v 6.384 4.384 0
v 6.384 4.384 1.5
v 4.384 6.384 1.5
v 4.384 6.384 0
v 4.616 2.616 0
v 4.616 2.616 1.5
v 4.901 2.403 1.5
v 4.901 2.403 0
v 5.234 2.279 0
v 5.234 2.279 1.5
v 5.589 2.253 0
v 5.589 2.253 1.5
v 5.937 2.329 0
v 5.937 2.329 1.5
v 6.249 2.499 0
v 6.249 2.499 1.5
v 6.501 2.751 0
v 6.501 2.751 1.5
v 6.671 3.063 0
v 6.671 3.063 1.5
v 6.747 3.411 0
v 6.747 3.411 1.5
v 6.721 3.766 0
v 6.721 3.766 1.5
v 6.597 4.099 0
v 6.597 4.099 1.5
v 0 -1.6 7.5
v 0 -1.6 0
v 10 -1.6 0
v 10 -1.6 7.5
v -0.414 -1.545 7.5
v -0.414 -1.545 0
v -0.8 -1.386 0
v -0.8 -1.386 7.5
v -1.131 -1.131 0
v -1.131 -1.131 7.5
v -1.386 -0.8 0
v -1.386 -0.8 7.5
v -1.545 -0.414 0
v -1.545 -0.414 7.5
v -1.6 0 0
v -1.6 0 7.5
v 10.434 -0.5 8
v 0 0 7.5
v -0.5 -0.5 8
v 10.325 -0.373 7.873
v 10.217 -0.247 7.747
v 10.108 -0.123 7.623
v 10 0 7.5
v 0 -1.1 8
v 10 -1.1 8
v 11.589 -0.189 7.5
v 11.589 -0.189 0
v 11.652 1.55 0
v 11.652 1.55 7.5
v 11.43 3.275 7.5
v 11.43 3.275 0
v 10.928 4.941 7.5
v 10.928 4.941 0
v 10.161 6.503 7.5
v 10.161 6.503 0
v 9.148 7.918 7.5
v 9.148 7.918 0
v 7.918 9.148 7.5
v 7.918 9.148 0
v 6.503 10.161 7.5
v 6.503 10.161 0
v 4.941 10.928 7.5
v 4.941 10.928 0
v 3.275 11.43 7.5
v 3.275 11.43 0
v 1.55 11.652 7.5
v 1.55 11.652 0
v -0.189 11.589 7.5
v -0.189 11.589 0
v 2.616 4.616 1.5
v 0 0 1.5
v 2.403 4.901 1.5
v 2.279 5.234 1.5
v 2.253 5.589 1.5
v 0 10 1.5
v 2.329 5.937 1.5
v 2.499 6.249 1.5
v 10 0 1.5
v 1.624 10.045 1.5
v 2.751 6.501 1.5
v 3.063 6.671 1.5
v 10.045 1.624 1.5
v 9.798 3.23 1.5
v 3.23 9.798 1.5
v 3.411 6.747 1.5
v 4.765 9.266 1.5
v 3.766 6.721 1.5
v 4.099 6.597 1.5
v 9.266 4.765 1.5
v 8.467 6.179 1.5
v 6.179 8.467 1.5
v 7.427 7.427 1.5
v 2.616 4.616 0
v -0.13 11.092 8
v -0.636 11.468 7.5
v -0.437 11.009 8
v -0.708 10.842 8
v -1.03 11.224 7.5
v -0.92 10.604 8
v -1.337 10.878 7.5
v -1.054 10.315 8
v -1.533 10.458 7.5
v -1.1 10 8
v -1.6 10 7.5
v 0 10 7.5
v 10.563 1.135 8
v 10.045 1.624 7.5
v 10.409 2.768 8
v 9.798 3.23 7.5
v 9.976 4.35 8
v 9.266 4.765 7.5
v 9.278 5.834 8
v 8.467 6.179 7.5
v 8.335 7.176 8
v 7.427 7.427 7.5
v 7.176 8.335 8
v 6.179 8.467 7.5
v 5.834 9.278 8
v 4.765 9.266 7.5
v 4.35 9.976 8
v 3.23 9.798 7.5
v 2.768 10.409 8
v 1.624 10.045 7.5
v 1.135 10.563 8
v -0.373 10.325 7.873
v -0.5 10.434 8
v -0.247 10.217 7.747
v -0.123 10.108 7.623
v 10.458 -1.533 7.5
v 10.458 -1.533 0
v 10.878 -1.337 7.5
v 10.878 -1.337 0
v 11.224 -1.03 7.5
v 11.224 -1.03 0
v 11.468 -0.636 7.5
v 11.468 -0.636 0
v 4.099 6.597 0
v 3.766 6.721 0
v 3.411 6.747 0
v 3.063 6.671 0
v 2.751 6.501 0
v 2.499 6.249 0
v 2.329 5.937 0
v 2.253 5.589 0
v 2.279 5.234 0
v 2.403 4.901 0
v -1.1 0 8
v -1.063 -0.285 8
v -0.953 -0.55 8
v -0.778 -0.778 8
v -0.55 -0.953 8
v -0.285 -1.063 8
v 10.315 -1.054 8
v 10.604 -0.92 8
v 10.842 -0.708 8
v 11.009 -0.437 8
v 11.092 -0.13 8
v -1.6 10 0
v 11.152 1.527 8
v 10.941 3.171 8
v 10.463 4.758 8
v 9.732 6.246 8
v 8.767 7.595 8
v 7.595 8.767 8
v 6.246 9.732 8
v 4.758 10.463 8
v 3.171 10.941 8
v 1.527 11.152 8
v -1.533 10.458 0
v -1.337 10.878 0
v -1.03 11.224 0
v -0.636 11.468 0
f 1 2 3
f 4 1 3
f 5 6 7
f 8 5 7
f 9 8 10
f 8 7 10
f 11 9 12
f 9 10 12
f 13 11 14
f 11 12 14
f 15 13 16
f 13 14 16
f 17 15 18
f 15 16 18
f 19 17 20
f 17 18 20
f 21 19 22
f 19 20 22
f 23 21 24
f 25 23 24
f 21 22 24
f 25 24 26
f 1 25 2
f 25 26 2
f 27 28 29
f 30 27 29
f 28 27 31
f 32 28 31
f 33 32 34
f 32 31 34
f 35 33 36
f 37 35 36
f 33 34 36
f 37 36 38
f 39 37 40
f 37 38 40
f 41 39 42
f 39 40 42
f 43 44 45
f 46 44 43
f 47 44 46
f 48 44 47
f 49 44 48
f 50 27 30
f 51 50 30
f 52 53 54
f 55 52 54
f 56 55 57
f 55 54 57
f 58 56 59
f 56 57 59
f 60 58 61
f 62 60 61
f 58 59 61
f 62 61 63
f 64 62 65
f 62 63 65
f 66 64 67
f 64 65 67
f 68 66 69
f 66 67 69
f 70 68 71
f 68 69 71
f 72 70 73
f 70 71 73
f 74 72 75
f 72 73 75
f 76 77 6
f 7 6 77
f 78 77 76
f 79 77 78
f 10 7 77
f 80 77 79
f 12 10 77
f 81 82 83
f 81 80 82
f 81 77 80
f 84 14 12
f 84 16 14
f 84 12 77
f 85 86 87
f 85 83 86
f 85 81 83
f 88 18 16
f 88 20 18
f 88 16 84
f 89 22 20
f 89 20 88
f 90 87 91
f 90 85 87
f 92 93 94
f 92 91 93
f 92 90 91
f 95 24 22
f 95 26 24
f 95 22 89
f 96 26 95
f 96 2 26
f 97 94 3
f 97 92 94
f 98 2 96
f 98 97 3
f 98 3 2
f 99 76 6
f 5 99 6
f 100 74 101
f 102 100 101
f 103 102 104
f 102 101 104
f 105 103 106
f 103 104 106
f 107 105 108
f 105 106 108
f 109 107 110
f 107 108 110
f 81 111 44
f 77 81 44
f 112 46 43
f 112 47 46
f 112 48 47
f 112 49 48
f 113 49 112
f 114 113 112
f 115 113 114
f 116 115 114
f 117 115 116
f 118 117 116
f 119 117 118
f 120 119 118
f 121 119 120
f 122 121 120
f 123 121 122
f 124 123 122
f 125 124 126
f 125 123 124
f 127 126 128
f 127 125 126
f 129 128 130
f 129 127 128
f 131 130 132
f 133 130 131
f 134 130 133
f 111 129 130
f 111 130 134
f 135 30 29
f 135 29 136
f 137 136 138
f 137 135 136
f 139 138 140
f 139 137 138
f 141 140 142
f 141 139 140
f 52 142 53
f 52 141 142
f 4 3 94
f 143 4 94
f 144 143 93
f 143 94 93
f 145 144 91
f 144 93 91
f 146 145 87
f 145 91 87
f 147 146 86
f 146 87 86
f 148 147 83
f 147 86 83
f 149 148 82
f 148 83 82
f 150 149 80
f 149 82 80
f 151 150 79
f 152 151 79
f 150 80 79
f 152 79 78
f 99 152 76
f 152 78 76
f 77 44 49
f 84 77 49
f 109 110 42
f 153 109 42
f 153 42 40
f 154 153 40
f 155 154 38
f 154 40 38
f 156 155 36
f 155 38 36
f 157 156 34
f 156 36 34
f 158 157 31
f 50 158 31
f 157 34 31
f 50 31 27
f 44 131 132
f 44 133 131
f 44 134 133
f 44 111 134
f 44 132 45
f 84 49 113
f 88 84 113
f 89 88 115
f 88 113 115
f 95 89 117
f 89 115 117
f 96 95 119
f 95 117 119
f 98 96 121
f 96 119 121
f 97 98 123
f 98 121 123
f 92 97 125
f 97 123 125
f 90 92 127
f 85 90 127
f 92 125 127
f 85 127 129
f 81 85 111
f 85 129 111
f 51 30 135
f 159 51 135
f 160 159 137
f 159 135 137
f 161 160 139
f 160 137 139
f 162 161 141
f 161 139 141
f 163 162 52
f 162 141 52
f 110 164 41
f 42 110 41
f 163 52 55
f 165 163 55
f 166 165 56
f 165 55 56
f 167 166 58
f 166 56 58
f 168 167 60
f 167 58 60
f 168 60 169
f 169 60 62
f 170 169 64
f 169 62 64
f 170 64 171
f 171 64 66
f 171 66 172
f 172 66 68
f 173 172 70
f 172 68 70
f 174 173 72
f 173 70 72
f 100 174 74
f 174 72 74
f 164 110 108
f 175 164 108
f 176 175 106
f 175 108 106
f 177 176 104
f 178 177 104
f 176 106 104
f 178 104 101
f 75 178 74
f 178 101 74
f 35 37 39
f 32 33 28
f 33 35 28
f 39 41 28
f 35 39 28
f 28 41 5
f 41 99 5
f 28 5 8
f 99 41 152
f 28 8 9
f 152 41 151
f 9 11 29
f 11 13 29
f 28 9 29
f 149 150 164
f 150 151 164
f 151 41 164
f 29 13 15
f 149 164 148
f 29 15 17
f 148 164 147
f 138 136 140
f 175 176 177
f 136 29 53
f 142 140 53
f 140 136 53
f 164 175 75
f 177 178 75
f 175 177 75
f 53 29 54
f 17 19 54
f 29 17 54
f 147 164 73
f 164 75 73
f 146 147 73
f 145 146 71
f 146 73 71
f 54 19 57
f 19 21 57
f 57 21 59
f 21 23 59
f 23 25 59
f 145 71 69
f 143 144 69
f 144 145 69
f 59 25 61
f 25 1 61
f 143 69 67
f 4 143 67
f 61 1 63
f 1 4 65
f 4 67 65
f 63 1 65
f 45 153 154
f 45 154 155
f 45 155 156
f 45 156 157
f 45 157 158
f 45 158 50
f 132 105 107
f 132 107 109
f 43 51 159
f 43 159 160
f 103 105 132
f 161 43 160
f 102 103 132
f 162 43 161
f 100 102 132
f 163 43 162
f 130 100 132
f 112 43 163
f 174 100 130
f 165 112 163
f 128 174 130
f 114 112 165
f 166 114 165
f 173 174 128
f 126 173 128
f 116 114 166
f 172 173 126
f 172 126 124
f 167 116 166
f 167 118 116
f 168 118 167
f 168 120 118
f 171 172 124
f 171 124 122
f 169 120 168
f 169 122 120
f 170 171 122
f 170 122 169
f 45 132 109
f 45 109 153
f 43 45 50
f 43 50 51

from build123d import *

# Parameters (mm, degrees)
EXTRUDE_1_DEPTH     = 8
CUT_EXTRUDE_1_DEPTH = 6.5
CUT_EXTRUDE_2_DEPTH = 18.728535031
FILLET_1_R          = 1.6
CHAMFER_2_SIZE      = 0.5


with BuildPart() as part:
    # 草图1 → 凸台-拉伸1 (new body)
    with BuildSketch(Plane.XY):
        with BuildLine():
            Line((-1.6, -1.6), (11.323037582, -1.6))
            ThreePointArc((11.323037582, -1.6), (8.558327944, 8.558327944), (-1.6, 11.323037582))
            Line((-1.6, 11.323037582), (-1.6, -1.6))
        make_face()
    extrude(amount=EXTRUDE_1_DEPTH)

    # 草图2 → 切除-拉伸1 (cut)
    with BuildSketch(Plane.XY.offset(8)):
        with BuildLine():
            Line((0, 0), (10, 0))
            ThreePointArc((10, 0), (7.426957094, 7.426957094), (0, 10))
            Line((0, 10), (0, 0))
        make_face()
    extrude(amount=-CUT_EXTRUDE_1_DEPTH, mode=Mode.SUBTRACT)

    # 草图5 → 切除-拉伸2 (cut, through all)
    with BuildSketch(Plane.XY.offset(1.5)):
        with BuildLine():
            Line((2.616116524, 4.616116524), (4.616116524, 2.616116524))
            ThreePointArc((4.616116524, 2.616116524), (6.383883476, 2.616116524), (6.383883476, 4.383883476))
            Line((6.383883476, 4.383883476), (4.383883476, 6.383883476))
            ThreePointArc((4.383883476, 6.383883476), (2.616116524, 6.383883476), (2.616116524, 4.616116524))
        make_face()
    extrude(amount=-CUT_EXTRUDE_2_DEPTH, mode=Mode.SUBTRACT)

    # 圆角1
    fillet_1_edges = [part.edges().sort_by_distance(p)[0] for p in [
        (-1.6, 11.323037582, 4),
        (11.323037582, -1.6, 4),
        (-1.6, -1.6, 4),
    ]]
    fillet(fillet_1_edges, radius=FILLET_1_R)

    # 倒角2
    chamfer_2_edges = [part.edges().sort_by_distance(p)[0] for p in [
        (0, 5, 8),
        (5, 0, 8),
        (7.426957094, 7.426957094, 8),
        (-1.6, 5, 8),
        (8.558327944, 8.558327944, 8),
        (5, -1.6, 8),
        (11.062458629, -1.19632005, 8),
        (-1.13137085, -1.13137085, 8),
        (-1.19632005, 11.062458629, 8),
    ]]
    chamfer(chamfer_2_edges, length=CHAMFER_2_SIZE)


solid = part.part
